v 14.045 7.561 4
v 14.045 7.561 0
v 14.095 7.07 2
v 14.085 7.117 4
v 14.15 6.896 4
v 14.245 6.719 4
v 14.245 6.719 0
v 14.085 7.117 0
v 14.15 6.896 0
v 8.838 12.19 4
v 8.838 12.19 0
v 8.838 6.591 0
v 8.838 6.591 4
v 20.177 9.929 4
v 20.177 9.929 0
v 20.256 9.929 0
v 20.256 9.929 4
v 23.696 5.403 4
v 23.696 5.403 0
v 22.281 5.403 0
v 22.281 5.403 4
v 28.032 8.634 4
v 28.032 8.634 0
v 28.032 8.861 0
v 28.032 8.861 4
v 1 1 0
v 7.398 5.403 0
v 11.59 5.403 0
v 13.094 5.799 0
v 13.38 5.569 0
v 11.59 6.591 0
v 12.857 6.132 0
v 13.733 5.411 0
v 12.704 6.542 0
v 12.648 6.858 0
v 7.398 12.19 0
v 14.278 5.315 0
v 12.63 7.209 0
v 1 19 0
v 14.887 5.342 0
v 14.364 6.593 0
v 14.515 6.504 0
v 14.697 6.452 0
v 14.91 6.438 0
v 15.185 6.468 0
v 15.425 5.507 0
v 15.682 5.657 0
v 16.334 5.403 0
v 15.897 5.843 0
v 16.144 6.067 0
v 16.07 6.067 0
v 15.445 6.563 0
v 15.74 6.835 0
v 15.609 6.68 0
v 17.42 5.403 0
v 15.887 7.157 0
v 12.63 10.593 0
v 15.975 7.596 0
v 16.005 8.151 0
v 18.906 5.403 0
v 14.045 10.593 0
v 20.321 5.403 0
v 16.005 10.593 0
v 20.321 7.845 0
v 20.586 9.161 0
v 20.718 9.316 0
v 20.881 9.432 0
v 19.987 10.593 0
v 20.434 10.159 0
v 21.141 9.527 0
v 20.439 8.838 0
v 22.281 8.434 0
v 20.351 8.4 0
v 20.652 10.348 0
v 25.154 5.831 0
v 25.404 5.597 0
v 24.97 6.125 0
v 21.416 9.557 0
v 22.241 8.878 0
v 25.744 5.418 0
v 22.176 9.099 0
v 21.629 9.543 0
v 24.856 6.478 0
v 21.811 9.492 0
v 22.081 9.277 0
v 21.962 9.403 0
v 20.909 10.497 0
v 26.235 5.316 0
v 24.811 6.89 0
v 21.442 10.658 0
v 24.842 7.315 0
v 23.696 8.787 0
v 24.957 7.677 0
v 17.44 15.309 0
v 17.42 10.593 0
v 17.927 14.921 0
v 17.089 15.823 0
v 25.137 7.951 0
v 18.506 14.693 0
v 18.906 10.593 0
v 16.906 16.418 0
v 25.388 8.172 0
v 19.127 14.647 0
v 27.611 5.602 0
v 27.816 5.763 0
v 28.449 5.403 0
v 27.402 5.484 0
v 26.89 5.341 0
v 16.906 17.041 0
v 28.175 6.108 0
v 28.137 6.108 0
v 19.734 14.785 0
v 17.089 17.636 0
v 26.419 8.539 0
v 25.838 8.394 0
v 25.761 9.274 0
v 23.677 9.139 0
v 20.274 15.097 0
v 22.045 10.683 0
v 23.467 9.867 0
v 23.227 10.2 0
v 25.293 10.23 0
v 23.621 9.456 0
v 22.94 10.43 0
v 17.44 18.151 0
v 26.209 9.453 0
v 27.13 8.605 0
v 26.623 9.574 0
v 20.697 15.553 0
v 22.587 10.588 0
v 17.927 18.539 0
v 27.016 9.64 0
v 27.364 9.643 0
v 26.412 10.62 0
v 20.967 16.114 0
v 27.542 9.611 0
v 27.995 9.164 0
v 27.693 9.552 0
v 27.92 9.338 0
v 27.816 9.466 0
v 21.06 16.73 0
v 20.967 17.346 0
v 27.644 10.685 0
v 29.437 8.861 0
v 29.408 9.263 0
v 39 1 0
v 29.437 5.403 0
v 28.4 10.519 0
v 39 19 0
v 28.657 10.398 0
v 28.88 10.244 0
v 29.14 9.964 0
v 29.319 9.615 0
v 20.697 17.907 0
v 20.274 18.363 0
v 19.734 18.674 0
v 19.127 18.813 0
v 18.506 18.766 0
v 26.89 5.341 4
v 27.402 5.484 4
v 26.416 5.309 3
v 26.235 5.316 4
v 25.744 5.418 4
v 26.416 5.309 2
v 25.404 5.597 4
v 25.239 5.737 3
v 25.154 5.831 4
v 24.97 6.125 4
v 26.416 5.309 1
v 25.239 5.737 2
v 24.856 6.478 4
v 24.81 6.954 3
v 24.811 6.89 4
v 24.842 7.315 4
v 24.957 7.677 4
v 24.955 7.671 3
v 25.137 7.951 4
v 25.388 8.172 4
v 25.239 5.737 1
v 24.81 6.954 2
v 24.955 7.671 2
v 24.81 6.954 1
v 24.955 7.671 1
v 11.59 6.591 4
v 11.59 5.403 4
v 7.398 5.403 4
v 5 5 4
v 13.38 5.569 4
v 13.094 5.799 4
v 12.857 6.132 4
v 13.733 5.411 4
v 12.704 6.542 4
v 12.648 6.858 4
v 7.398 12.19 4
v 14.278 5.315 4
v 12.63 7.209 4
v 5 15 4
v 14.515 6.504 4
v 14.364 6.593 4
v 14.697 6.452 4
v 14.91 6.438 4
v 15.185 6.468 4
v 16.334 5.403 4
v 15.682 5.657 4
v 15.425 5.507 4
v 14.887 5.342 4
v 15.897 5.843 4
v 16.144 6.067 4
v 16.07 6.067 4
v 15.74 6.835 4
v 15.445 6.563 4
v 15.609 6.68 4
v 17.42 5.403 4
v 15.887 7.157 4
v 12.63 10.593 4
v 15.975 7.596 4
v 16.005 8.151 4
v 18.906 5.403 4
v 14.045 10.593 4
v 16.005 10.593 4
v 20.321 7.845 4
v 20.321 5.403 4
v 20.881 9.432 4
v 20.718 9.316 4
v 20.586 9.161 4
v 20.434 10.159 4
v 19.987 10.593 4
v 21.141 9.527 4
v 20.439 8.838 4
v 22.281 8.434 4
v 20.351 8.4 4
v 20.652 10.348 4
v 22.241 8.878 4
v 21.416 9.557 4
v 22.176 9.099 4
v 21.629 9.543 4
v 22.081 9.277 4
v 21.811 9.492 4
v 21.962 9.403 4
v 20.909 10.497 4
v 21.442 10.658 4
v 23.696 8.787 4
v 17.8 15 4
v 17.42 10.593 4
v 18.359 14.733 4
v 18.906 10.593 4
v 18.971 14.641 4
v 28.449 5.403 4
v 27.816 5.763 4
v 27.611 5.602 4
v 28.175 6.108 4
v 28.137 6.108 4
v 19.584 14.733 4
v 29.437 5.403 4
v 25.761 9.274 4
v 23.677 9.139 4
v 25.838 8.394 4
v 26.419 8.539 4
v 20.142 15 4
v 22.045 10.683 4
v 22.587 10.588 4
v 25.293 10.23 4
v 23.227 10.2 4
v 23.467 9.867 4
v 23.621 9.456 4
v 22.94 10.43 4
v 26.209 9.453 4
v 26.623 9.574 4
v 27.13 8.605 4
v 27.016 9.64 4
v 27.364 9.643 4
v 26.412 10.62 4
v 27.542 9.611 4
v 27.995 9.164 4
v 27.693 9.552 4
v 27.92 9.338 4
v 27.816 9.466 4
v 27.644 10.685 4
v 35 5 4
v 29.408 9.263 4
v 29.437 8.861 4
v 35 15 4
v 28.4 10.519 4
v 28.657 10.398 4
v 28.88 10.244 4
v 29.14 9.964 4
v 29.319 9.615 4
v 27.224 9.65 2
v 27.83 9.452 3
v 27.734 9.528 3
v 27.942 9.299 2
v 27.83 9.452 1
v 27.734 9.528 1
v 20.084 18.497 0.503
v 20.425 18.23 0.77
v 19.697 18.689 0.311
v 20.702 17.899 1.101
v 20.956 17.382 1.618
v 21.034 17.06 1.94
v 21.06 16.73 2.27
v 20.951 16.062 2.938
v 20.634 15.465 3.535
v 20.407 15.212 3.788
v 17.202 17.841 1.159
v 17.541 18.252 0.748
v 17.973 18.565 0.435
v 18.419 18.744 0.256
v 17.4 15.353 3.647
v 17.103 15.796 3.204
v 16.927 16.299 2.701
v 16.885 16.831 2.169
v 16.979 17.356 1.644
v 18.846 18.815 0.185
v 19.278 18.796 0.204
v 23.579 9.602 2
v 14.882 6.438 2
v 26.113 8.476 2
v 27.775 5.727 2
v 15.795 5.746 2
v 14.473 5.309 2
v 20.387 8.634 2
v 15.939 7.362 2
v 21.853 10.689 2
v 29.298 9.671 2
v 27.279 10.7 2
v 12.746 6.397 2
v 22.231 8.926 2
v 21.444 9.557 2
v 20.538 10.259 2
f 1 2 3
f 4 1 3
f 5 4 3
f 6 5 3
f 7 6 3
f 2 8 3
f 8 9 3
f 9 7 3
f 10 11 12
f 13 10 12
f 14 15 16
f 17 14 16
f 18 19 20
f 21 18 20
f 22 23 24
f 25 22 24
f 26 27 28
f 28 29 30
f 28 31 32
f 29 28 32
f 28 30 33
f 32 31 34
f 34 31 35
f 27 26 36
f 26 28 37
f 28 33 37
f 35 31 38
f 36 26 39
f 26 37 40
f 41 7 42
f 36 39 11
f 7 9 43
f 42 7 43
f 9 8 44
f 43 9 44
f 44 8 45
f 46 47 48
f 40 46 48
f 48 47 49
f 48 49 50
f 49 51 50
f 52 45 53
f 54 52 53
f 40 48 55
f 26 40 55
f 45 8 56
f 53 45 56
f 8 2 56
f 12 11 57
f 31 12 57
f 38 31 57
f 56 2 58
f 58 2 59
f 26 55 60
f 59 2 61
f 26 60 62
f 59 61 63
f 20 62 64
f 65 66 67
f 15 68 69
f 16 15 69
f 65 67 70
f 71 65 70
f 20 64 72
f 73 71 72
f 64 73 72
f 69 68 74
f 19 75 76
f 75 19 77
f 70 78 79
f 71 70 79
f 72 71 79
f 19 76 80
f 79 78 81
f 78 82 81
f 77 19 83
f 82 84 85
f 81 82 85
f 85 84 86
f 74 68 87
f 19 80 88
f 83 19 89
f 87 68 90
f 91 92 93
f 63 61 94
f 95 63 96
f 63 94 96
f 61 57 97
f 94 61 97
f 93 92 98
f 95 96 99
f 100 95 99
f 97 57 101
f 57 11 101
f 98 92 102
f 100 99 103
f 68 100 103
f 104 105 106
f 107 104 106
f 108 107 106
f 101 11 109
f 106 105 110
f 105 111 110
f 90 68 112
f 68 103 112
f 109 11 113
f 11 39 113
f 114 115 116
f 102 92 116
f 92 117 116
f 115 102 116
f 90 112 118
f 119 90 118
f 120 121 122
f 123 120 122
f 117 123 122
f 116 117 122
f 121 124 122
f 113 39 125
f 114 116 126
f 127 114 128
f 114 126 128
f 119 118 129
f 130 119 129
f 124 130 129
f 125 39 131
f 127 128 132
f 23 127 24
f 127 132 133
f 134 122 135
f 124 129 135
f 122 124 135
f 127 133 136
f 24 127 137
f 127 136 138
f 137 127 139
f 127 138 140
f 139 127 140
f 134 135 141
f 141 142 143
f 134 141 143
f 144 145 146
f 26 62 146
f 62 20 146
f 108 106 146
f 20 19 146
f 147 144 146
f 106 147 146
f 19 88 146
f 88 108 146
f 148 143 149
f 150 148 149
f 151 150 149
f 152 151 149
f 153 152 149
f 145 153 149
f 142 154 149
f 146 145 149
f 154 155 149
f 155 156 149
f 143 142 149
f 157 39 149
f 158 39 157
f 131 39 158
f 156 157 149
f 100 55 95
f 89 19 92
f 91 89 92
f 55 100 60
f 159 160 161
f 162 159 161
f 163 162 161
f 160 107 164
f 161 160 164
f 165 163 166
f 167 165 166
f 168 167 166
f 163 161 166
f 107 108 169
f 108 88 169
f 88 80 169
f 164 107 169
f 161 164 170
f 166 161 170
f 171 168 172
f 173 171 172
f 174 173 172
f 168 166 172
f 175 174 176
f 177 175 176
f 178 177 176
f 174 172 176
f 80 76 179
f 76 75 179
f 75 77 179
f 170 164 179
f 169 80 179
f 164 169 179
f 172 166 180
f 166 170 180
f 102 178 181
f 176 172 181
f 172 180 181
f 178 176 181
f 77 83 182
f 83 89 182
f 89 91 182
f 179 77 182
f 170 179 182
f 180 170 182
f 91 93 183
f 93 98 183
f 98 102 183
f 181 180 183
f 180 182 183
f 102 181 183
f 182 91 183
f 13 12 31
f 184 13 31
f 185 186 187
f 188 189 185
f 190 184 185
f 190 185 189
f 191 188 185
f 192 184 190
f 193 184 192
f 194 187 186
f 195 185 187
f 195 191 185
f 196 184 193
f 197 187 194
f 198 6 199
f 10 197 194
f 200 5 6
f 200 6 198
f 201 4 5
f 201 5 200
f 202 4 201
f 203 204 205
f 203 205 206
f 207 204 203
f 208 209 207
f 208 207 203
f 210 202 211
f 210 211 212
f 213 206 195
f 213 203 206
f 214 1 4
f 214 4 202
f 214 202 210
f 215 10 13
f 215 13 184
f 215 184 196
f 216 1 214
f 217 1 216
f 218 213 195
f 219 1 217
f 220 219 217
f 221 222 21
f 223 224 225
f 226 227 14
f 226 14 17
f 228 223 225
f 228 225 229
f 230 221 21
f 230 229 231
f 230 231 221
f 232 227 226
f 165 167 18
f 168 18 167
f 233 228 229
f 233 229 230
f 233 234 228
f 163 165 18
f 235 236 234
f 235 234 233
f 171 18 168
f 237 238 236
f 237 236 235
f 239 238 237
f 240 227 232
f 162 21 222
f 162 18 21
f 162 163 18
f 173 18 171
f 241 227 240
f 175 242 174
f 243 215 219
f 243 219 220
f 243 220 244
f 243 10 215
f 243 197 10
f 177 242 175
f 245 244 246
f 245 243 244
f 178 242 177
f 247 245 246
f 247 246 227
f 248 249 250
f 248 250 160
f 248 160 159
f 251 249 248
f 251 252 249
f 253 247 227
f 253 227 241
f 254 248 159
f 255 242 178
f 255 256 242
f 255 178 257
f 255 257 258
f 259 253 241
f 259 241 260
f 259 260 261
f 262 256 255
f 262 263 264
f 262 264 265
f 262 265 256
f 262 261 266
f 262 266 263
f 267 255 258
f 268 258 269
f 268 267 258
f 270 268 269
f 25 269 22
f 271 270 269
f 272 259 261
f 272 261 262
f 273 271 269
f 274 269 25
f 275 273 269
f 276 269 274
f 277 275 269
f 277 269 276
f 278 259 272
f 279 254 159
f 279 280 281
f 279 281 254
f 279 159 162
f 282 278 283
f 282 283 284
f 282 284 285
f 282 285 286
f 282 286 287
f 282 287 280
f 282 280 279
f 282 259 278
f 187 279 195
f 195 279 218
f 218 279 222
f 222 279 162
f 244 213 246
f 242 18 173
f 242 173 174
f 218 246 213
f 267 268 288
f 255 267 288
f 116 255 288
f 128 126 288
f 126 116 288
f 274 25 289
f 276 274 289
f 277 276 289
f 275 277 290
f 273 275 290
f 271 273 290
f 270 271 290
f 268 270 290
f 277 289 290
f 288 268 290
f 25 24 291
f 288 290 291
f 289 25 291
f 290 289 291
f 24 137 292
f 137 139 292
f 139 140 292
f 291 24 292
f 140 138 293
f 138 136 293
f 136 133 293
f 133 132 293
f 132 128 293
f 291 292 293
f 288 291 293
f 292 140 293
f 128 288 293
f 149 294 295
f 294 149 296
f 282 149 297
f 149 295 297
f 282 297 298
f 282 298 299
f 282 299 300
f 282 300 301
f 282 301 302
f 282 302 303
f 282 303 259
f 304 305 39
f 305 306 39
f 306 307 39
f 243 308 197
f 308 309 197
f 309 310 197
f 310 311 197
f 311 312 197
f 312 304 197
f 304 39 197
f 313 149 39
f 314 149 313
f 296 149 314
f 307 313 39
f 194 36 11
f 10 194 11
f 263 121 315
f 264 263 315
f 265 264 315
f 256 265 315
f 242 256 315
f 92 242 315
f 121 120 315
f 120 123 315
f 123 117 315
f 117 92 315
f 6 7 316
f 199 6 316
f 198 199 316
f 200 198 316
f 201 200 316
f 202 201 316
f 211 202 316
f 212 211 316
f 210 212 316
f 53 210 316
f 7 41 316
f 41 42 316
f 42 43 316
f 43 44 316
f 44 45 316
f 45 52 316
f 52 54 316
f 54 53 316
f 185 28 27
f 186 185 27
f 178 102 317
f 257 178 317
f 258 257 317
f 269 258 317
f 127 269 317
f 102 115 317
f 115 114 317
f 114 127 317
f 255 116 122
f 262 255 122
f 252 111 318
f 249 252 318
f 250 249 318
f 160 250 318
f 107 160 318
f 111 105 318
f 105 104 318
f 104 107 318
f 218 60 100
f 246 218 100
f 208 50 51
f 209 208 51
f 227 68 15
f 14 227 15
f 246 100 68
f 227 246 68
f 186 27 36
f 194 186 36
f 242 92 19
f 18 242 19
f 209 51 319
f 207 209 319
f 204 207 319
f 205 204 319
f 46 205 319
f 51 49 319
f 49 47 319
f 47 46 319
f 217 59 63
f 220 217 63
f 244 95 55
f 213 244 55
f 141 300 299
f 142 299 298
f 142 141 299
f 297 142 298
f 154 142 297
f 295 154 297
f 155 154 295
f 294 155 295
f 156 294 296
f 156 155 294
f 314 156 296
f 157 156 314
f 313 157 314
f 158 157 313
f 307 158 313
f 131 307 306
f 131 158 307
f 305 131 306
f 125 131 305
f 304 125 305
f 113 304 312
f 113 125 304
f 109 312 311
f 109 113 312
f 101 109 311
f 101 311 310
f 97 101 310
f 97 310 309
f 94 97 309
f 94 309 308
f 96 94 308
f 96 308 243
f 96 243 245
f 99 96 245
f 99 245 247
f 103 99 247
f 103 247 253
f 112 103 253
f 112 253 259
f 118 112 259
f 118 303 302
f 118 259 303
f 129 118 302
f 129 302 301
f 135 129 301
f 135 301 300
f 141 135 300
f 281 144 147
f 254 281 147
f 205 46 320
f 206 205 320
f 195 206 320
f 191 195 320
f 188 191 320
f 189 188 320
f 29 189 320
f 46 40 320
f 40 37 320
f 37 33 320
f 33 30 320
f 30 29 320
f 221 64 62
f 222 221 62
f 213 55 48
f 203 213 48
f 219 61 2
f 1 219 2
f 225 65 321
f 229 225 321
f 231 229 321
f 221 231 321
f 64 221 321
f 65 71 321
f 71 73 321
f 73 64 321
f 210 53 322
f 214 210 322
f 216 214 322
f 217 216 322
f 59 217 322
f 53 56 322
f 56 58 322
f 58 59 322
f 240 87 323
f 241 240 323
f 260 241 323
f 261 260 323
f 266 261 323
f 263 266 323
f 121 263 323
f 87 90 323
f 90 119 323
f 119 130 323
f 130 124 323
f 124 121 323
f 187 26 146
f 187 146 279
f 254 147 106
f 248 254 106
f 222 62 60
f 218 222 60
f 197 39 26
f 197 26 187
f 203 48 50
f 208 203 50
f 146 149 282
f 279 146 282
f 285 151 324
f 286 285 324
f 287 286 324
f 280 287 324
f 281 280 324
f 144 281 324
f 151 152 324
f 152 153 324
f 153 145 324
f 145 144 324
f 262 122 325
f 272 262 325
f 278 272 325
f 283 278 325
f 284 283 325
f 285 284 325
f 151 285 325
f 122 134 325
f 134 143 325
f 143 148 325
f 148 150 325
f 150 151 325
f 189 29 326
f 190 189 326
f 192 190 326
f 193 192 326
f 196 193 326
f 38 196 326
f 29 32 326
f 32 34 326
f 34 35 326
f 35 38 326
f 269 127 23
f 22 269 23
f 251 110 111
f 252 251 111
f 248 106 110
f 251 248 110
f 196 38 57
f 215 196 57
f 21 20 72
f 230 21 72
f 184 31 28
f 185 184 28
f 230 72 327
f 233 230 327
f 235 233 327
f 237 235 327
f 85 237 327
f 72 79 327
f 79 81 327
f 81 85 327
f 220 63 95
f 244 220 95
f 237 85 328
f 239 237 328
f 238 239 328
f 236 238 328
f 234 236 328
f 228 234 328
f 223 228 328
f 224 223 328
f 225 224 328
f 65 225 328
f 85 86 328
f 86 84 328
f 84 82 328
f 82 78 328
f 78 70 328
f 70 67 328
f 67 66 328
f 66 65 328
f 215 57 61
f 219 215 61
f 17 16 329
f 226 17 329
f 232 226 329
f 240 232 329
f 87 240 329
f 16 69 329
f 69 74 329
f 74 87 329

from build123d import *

# Parameters (mm, degrees)
F0_W        = 40
F0_H        = 20
F0_R        = 2.0889371437
F1_DEPTH    = 4
F2_T1_DEPTH = 65.7168298797
F2_T3_DEPTH = 45.7168298797


# Not quite as in the source:
# - a fillet or chamfer that OpenCascade refuses, or shapes differently, is made with other operations: its cross-section is extruded or revolved along the edge and cut away or added


with BuildPart() as f1:
    # F0 (on Top) → F1 (new body)
    with BuildSketch(Plane.XY):
        with Locations((20, 10)):
            Rectangle(F0_W, F0_H)
        Polygon((11.590113647, 5.4027722217), (7.3983091854, 5.4027722217), (7.3983091854, 12.1895739882), (8.8376637294, 12.1895739882), (8.8376637294, 6.5910938267), (11.590113647, 6.5910938267), align=None, mode=Mode.SUBTRACT)
        with BuildLine():
            Line((17.4203165215, 5.4027722217), (16.3344876549, 5.4027722217))
            Line((16.3344876549, 5.4027722217), (16.1443561981, 6.0667469185))
            Line((16.1443561981, 6.0667469185), (16.0700860978, 6.0667469185))
            add(Edge.make_bspline(
                [(16.0700860978, 6.0667469185), (15.8428195908, 5.704308829), (15.4246789261, 5.5067503622)],
                knots=[0, 0, 0, 1, 1, 1], degree=2))
            add(Edge.make_bspline(
                [(15.4246789261, 5.5067503622), (15.0065382613, 5.3091918953), (14.4732789411, 5.3091918953)],
                knots=[0, 0, 0, 1, 1, 1], degree=2))
            add(Edge.make_bspline(
                [(14.4732789411, 5.3091918953), (13.5582713053, 5.3091918953), (13.0940831783, 5.7993745574)],
                knots=[0, 0, 0, 1, 1, 1], degree=2))
            add(Edge.make_bspline(
                [(13.0940831783, 5.7993745574), (12.6298950514, 6.2895572194), (12.6298950514, 7.2090210613)],
                knots=[0, 0, 0, 1, 1, 1], degree=2))
            Line((12.6298950514, 7.2090210613), (12.6298950514, 10.5927668315))
            Line((12.6298950514, 10.5927668315), (14.0454831633, 10.5927668315))
            Line((14.0454831633, 10.5927668315), (14.0454831633, 7.5610613368))
            add(Edge.make_bspline(
                [(14.0454831633, 7.5610613368), (14.0454831633, 6.9995793784), (14.2452697331, 6.7188383992)],
                knots=[0, 0, 0, 1, 1, 1], degree=2))
            add(Edge.make_bspline(
                [(14.2452697331, 6.7188383992), (14.445056303, 6.4380974201), (14.8817644928, 6.4380974201)],
                knots=[0, 0, 0, 1, 1, 1], degree=2))
            add(Edge.make_bspline(
                [(14.8817644928, 6.4380974201), (15.4759252953, 6.4380974201), (15.7403268524, 6.8346997557)],
                knots=[0, 0, 0, 1, 1, 1], degree=2))
            add(Edge.make_bspline(
                [(15.7403268524, 6.8346997557), (16.0047284095, 7.2313020914), (16.0047284095, 8.1507659333)],
                knots=[0, 0, 0, 1, 1, 1], degree=2))
            Line((16.0047284095, 8.1507659333), (16.0047284095, 10.5927668315))
            Line((16.0047284095, 10.5927668315), (17.4203165215, 10.5927668315))
            Line((17.4203165215, 10.5927668315), (17.4203165215, 5.4027722217))
        make_face(mode=Mode.SUBTRACT)
        with BuildLine():
            Line((23.6961399978, 8.7865179919), (23.6961399978, 5.4027722217))
            Line((23.6961399978, 5.4027722217), (22.2805518859, 5.4027722217))
            Line((22.2805518859, 5.4027722217), (22.2805518859, 8.4344777164))
            add(Edge.make_bspline(
                [(22.2805518859, 8.4344777164), (22.2805518859, 8.9959596748), (22.080765316, 9.276700654)],
                knots=[0, 0, 0, 1, 1, 1], degree=2))
            add(Edge.make_bspline(
                [(22.080765316, 9.276700654), (21.8809787462, 9.5574416332), (21.4442705564, 9.5574416332)],
                knots=[0, 0, 0, 1, 1, 1], degree=2))
            add(Edge.make_bspline(
                [(21.4442705564, 9.5574416332), (20.8501097539, 9.5574416332), (20.5857081968, 9.1608392975)],
                knots=[0, 0, 0, 1, 1, 1], degree=2))
            add(Edge.make_bspline(
                [(20.5857081968, 9.1608392975), (20.3213066396, 8.7642369618), (20.3213066396, 7.84477312)],
                knots=[0, 0, 0, 1, 1, 1], degree=2))
            Line((20.3213066396, 7.84477312), (20.3213066396, 5.4027722217))
            Line((20.3213066396, 5.4027722217), (18.9057185277, 5.4027722217))
            Line((18.9057185277, 5.4027722217), (18.9057185277, 10.5927668315))
            Line((18.9057185277, 10.5927668315), (19.9870911882, 10.5927668315))
            Line((19.9870911882, 10.5927668315), (20.177222645, 9.9287921347))
            Line((20.177222645, 9.9287921347), (20.2559489514, 9.9287921347))
            add(Edge.make_bspline(
                [(20.2559489514, 9.9287921347), (20.4936132724, 10.3045988423), (20.9087831331, 10.4969584021)],
                knots=[0, 0, 0, 1, 1, 1], degree=2))
            add(Edge.make_bspline(
                [(20.9087831331, 10.4969584021), (21.3239529939, 10.6893179619), (21.8527561081, 10.6893179619)],
                knots=[0, 0, 0, 1, 1, 1], degree=2))
            add(Edge.make_bspline(
                [(21.8527561081, 10.6893179619), (22.7588513319, 10.6893179619), (23.2274956648, 10.1998780009)],
                knots=[0, 0, 0, 1, 1, 1], degree=2))
            add(Edge.make_bspline(
                [(23.2274956648, 10.1998780009), (23.6961399978, 9.7104380398), (23.6961399978, 8.7865179919)],
                knots=[0, 0, 0, 1, 1, 1], degree=2))
        make_face(mode=Mode.SUBTRACT)
        with BuildLine():
            Line((29.4372187519, 5.4027722217), (28.4494264178, 5.4027722217))
            Line((28.4494264178, 5.4027722217), (28.1746270466, 6.1083381747))
            Line((28.1746270466, 6.1083381747), (28.1374919965, 6.1083381747))
            add(Edge.make_bspline(
                [(28.1374919965, 6.1083381747), (27.780995515, 5.6582613668), (27.4022180034, 5.4837266311)],
                knots=[0, 0, 0, 1, 1, 1], degree=2))
            add(Edge.make_bspline(
                [(27.4022180034, 5.4837266311), (27.0234404918, 5.3091918953), (26.4159110712, 5.3091918953)],
                knots=[0, 0, 0, 1, 1, 1], degree=2))
            add(Edge.make_bspline(
                [(26.4159110712, 5.3091918953), (25.6687538621, 5.3091918953), (25.2394726823, 5.7369876731)],
                knots=[0, 0, 0, 1, 1, 1], degree=2))
            add(Edge.make_bspline(
                [(25.2394726823, 5.7369876731), (24.8101915025, 6.1647834509), (24.8101915025, 6.9535319162)],
                knots=[0, 0, 0, 1, 1, 1], degree=2))
            add(Edge.make_bspline(
                [(24.8101915025, 6.9535319162), (24.8101915025, 7.7794154317), (25.3880128829, 8.1715615613)],
                knots=[0, 0, 0, 1, 1, 1], degree=2))
            add(Edge.make_bspline(
                [(25.3880128829, 8.1715615613), (25.9658342633, 8.563707691), (27.1303894362, 8.6052989472)],
                knots=[0, 0, 0, 1, 1, 1], degree=2))
            Line((27.1303894362, 8.6052989472), (28.032028454, 8.6335215853))
            Line((28.032028454, 8.6335215853), (28.032028454, 8.8607880922))
            add(Edge.make_bspline(
                [(28.032028454, 8.8607880922), (28.032028454, 9.6495365575), (27.2239697626, 9.6495365575)],
                knots=[0, 0, 0, 1, 1, 1], degree=2))
            add(Edge.make_bspline(
                [(27.2239697626, 9.6495365575), (26.601586322, 9.6495365575), (25.7608487865, 9.27372985)],
                knots=[0, 0, 0, 1, 1, 1], degree=2))
            Line((25.7608487865, 9.27372985), (25.2929471545, 10.230328742))
            add(Edge.make_bspline(
                [(25.2929471545, 10.230328742), (26.1886445643, 10.699715776), (27.2789296369, 10.699715776)],
                knots=[0, 0, 0, 1, 1, 1], degree=2))
            add(Edge.make_bspline(
                [(27.2789296369, 10.699715776), (28.3231672472, 10.699715776), (28.8801929996, 10.244440061)],
                knots=[0, 0, 0, 1, 1, 1], degree=2))
            add(Edge.make_bspline(
                [(28.8801929996, 10.244440061), (29.4372187519, 9.7891643461), (29.4372187519, 8.8607880922)],
                knots=[0, 0, 0, 1, 1, 1], degree=2))
            Line((29.4372187519, 8.8607880922), (29.4372187519, 5.4027722217))
        make_face(mode=Mode.SUBTRACT)
        with Locations((18.9712941647, 16.7298167944)):
            Circle(F0_R, mode=Mode.SUBTRACT)
    extrude(amount=F1_DEPTH)

    # F2: chamfer of 5 on 4 edges, made by hand

    # F2_s2 → F2_t1 (cut)
    with BuildSketch(Plane.YZ.offset(-12.8584149398)):
        Polygon((20, -1), (15, 4), (20, 4), align=None)
        Polygon((0, -1), (5, 4), (0, 4), align=None)
    extrude(amount=F2_T1_DEPTH, mode=Mode.SUBTRACT)

    # F2_s4 → F2_t3 (cut)
    with BuildSketch(Plane.XZ.offset(-32.8584149398)):
        Polygon((0, -1), (5, 4), (0, 4), align=None)
        Polygon((40, -1), (35, 4), (40, 4), align=None)
    extrude(amount=F2_T3_DEPTH, mode=Mode.SUBTRACT)


solid = f1.part
